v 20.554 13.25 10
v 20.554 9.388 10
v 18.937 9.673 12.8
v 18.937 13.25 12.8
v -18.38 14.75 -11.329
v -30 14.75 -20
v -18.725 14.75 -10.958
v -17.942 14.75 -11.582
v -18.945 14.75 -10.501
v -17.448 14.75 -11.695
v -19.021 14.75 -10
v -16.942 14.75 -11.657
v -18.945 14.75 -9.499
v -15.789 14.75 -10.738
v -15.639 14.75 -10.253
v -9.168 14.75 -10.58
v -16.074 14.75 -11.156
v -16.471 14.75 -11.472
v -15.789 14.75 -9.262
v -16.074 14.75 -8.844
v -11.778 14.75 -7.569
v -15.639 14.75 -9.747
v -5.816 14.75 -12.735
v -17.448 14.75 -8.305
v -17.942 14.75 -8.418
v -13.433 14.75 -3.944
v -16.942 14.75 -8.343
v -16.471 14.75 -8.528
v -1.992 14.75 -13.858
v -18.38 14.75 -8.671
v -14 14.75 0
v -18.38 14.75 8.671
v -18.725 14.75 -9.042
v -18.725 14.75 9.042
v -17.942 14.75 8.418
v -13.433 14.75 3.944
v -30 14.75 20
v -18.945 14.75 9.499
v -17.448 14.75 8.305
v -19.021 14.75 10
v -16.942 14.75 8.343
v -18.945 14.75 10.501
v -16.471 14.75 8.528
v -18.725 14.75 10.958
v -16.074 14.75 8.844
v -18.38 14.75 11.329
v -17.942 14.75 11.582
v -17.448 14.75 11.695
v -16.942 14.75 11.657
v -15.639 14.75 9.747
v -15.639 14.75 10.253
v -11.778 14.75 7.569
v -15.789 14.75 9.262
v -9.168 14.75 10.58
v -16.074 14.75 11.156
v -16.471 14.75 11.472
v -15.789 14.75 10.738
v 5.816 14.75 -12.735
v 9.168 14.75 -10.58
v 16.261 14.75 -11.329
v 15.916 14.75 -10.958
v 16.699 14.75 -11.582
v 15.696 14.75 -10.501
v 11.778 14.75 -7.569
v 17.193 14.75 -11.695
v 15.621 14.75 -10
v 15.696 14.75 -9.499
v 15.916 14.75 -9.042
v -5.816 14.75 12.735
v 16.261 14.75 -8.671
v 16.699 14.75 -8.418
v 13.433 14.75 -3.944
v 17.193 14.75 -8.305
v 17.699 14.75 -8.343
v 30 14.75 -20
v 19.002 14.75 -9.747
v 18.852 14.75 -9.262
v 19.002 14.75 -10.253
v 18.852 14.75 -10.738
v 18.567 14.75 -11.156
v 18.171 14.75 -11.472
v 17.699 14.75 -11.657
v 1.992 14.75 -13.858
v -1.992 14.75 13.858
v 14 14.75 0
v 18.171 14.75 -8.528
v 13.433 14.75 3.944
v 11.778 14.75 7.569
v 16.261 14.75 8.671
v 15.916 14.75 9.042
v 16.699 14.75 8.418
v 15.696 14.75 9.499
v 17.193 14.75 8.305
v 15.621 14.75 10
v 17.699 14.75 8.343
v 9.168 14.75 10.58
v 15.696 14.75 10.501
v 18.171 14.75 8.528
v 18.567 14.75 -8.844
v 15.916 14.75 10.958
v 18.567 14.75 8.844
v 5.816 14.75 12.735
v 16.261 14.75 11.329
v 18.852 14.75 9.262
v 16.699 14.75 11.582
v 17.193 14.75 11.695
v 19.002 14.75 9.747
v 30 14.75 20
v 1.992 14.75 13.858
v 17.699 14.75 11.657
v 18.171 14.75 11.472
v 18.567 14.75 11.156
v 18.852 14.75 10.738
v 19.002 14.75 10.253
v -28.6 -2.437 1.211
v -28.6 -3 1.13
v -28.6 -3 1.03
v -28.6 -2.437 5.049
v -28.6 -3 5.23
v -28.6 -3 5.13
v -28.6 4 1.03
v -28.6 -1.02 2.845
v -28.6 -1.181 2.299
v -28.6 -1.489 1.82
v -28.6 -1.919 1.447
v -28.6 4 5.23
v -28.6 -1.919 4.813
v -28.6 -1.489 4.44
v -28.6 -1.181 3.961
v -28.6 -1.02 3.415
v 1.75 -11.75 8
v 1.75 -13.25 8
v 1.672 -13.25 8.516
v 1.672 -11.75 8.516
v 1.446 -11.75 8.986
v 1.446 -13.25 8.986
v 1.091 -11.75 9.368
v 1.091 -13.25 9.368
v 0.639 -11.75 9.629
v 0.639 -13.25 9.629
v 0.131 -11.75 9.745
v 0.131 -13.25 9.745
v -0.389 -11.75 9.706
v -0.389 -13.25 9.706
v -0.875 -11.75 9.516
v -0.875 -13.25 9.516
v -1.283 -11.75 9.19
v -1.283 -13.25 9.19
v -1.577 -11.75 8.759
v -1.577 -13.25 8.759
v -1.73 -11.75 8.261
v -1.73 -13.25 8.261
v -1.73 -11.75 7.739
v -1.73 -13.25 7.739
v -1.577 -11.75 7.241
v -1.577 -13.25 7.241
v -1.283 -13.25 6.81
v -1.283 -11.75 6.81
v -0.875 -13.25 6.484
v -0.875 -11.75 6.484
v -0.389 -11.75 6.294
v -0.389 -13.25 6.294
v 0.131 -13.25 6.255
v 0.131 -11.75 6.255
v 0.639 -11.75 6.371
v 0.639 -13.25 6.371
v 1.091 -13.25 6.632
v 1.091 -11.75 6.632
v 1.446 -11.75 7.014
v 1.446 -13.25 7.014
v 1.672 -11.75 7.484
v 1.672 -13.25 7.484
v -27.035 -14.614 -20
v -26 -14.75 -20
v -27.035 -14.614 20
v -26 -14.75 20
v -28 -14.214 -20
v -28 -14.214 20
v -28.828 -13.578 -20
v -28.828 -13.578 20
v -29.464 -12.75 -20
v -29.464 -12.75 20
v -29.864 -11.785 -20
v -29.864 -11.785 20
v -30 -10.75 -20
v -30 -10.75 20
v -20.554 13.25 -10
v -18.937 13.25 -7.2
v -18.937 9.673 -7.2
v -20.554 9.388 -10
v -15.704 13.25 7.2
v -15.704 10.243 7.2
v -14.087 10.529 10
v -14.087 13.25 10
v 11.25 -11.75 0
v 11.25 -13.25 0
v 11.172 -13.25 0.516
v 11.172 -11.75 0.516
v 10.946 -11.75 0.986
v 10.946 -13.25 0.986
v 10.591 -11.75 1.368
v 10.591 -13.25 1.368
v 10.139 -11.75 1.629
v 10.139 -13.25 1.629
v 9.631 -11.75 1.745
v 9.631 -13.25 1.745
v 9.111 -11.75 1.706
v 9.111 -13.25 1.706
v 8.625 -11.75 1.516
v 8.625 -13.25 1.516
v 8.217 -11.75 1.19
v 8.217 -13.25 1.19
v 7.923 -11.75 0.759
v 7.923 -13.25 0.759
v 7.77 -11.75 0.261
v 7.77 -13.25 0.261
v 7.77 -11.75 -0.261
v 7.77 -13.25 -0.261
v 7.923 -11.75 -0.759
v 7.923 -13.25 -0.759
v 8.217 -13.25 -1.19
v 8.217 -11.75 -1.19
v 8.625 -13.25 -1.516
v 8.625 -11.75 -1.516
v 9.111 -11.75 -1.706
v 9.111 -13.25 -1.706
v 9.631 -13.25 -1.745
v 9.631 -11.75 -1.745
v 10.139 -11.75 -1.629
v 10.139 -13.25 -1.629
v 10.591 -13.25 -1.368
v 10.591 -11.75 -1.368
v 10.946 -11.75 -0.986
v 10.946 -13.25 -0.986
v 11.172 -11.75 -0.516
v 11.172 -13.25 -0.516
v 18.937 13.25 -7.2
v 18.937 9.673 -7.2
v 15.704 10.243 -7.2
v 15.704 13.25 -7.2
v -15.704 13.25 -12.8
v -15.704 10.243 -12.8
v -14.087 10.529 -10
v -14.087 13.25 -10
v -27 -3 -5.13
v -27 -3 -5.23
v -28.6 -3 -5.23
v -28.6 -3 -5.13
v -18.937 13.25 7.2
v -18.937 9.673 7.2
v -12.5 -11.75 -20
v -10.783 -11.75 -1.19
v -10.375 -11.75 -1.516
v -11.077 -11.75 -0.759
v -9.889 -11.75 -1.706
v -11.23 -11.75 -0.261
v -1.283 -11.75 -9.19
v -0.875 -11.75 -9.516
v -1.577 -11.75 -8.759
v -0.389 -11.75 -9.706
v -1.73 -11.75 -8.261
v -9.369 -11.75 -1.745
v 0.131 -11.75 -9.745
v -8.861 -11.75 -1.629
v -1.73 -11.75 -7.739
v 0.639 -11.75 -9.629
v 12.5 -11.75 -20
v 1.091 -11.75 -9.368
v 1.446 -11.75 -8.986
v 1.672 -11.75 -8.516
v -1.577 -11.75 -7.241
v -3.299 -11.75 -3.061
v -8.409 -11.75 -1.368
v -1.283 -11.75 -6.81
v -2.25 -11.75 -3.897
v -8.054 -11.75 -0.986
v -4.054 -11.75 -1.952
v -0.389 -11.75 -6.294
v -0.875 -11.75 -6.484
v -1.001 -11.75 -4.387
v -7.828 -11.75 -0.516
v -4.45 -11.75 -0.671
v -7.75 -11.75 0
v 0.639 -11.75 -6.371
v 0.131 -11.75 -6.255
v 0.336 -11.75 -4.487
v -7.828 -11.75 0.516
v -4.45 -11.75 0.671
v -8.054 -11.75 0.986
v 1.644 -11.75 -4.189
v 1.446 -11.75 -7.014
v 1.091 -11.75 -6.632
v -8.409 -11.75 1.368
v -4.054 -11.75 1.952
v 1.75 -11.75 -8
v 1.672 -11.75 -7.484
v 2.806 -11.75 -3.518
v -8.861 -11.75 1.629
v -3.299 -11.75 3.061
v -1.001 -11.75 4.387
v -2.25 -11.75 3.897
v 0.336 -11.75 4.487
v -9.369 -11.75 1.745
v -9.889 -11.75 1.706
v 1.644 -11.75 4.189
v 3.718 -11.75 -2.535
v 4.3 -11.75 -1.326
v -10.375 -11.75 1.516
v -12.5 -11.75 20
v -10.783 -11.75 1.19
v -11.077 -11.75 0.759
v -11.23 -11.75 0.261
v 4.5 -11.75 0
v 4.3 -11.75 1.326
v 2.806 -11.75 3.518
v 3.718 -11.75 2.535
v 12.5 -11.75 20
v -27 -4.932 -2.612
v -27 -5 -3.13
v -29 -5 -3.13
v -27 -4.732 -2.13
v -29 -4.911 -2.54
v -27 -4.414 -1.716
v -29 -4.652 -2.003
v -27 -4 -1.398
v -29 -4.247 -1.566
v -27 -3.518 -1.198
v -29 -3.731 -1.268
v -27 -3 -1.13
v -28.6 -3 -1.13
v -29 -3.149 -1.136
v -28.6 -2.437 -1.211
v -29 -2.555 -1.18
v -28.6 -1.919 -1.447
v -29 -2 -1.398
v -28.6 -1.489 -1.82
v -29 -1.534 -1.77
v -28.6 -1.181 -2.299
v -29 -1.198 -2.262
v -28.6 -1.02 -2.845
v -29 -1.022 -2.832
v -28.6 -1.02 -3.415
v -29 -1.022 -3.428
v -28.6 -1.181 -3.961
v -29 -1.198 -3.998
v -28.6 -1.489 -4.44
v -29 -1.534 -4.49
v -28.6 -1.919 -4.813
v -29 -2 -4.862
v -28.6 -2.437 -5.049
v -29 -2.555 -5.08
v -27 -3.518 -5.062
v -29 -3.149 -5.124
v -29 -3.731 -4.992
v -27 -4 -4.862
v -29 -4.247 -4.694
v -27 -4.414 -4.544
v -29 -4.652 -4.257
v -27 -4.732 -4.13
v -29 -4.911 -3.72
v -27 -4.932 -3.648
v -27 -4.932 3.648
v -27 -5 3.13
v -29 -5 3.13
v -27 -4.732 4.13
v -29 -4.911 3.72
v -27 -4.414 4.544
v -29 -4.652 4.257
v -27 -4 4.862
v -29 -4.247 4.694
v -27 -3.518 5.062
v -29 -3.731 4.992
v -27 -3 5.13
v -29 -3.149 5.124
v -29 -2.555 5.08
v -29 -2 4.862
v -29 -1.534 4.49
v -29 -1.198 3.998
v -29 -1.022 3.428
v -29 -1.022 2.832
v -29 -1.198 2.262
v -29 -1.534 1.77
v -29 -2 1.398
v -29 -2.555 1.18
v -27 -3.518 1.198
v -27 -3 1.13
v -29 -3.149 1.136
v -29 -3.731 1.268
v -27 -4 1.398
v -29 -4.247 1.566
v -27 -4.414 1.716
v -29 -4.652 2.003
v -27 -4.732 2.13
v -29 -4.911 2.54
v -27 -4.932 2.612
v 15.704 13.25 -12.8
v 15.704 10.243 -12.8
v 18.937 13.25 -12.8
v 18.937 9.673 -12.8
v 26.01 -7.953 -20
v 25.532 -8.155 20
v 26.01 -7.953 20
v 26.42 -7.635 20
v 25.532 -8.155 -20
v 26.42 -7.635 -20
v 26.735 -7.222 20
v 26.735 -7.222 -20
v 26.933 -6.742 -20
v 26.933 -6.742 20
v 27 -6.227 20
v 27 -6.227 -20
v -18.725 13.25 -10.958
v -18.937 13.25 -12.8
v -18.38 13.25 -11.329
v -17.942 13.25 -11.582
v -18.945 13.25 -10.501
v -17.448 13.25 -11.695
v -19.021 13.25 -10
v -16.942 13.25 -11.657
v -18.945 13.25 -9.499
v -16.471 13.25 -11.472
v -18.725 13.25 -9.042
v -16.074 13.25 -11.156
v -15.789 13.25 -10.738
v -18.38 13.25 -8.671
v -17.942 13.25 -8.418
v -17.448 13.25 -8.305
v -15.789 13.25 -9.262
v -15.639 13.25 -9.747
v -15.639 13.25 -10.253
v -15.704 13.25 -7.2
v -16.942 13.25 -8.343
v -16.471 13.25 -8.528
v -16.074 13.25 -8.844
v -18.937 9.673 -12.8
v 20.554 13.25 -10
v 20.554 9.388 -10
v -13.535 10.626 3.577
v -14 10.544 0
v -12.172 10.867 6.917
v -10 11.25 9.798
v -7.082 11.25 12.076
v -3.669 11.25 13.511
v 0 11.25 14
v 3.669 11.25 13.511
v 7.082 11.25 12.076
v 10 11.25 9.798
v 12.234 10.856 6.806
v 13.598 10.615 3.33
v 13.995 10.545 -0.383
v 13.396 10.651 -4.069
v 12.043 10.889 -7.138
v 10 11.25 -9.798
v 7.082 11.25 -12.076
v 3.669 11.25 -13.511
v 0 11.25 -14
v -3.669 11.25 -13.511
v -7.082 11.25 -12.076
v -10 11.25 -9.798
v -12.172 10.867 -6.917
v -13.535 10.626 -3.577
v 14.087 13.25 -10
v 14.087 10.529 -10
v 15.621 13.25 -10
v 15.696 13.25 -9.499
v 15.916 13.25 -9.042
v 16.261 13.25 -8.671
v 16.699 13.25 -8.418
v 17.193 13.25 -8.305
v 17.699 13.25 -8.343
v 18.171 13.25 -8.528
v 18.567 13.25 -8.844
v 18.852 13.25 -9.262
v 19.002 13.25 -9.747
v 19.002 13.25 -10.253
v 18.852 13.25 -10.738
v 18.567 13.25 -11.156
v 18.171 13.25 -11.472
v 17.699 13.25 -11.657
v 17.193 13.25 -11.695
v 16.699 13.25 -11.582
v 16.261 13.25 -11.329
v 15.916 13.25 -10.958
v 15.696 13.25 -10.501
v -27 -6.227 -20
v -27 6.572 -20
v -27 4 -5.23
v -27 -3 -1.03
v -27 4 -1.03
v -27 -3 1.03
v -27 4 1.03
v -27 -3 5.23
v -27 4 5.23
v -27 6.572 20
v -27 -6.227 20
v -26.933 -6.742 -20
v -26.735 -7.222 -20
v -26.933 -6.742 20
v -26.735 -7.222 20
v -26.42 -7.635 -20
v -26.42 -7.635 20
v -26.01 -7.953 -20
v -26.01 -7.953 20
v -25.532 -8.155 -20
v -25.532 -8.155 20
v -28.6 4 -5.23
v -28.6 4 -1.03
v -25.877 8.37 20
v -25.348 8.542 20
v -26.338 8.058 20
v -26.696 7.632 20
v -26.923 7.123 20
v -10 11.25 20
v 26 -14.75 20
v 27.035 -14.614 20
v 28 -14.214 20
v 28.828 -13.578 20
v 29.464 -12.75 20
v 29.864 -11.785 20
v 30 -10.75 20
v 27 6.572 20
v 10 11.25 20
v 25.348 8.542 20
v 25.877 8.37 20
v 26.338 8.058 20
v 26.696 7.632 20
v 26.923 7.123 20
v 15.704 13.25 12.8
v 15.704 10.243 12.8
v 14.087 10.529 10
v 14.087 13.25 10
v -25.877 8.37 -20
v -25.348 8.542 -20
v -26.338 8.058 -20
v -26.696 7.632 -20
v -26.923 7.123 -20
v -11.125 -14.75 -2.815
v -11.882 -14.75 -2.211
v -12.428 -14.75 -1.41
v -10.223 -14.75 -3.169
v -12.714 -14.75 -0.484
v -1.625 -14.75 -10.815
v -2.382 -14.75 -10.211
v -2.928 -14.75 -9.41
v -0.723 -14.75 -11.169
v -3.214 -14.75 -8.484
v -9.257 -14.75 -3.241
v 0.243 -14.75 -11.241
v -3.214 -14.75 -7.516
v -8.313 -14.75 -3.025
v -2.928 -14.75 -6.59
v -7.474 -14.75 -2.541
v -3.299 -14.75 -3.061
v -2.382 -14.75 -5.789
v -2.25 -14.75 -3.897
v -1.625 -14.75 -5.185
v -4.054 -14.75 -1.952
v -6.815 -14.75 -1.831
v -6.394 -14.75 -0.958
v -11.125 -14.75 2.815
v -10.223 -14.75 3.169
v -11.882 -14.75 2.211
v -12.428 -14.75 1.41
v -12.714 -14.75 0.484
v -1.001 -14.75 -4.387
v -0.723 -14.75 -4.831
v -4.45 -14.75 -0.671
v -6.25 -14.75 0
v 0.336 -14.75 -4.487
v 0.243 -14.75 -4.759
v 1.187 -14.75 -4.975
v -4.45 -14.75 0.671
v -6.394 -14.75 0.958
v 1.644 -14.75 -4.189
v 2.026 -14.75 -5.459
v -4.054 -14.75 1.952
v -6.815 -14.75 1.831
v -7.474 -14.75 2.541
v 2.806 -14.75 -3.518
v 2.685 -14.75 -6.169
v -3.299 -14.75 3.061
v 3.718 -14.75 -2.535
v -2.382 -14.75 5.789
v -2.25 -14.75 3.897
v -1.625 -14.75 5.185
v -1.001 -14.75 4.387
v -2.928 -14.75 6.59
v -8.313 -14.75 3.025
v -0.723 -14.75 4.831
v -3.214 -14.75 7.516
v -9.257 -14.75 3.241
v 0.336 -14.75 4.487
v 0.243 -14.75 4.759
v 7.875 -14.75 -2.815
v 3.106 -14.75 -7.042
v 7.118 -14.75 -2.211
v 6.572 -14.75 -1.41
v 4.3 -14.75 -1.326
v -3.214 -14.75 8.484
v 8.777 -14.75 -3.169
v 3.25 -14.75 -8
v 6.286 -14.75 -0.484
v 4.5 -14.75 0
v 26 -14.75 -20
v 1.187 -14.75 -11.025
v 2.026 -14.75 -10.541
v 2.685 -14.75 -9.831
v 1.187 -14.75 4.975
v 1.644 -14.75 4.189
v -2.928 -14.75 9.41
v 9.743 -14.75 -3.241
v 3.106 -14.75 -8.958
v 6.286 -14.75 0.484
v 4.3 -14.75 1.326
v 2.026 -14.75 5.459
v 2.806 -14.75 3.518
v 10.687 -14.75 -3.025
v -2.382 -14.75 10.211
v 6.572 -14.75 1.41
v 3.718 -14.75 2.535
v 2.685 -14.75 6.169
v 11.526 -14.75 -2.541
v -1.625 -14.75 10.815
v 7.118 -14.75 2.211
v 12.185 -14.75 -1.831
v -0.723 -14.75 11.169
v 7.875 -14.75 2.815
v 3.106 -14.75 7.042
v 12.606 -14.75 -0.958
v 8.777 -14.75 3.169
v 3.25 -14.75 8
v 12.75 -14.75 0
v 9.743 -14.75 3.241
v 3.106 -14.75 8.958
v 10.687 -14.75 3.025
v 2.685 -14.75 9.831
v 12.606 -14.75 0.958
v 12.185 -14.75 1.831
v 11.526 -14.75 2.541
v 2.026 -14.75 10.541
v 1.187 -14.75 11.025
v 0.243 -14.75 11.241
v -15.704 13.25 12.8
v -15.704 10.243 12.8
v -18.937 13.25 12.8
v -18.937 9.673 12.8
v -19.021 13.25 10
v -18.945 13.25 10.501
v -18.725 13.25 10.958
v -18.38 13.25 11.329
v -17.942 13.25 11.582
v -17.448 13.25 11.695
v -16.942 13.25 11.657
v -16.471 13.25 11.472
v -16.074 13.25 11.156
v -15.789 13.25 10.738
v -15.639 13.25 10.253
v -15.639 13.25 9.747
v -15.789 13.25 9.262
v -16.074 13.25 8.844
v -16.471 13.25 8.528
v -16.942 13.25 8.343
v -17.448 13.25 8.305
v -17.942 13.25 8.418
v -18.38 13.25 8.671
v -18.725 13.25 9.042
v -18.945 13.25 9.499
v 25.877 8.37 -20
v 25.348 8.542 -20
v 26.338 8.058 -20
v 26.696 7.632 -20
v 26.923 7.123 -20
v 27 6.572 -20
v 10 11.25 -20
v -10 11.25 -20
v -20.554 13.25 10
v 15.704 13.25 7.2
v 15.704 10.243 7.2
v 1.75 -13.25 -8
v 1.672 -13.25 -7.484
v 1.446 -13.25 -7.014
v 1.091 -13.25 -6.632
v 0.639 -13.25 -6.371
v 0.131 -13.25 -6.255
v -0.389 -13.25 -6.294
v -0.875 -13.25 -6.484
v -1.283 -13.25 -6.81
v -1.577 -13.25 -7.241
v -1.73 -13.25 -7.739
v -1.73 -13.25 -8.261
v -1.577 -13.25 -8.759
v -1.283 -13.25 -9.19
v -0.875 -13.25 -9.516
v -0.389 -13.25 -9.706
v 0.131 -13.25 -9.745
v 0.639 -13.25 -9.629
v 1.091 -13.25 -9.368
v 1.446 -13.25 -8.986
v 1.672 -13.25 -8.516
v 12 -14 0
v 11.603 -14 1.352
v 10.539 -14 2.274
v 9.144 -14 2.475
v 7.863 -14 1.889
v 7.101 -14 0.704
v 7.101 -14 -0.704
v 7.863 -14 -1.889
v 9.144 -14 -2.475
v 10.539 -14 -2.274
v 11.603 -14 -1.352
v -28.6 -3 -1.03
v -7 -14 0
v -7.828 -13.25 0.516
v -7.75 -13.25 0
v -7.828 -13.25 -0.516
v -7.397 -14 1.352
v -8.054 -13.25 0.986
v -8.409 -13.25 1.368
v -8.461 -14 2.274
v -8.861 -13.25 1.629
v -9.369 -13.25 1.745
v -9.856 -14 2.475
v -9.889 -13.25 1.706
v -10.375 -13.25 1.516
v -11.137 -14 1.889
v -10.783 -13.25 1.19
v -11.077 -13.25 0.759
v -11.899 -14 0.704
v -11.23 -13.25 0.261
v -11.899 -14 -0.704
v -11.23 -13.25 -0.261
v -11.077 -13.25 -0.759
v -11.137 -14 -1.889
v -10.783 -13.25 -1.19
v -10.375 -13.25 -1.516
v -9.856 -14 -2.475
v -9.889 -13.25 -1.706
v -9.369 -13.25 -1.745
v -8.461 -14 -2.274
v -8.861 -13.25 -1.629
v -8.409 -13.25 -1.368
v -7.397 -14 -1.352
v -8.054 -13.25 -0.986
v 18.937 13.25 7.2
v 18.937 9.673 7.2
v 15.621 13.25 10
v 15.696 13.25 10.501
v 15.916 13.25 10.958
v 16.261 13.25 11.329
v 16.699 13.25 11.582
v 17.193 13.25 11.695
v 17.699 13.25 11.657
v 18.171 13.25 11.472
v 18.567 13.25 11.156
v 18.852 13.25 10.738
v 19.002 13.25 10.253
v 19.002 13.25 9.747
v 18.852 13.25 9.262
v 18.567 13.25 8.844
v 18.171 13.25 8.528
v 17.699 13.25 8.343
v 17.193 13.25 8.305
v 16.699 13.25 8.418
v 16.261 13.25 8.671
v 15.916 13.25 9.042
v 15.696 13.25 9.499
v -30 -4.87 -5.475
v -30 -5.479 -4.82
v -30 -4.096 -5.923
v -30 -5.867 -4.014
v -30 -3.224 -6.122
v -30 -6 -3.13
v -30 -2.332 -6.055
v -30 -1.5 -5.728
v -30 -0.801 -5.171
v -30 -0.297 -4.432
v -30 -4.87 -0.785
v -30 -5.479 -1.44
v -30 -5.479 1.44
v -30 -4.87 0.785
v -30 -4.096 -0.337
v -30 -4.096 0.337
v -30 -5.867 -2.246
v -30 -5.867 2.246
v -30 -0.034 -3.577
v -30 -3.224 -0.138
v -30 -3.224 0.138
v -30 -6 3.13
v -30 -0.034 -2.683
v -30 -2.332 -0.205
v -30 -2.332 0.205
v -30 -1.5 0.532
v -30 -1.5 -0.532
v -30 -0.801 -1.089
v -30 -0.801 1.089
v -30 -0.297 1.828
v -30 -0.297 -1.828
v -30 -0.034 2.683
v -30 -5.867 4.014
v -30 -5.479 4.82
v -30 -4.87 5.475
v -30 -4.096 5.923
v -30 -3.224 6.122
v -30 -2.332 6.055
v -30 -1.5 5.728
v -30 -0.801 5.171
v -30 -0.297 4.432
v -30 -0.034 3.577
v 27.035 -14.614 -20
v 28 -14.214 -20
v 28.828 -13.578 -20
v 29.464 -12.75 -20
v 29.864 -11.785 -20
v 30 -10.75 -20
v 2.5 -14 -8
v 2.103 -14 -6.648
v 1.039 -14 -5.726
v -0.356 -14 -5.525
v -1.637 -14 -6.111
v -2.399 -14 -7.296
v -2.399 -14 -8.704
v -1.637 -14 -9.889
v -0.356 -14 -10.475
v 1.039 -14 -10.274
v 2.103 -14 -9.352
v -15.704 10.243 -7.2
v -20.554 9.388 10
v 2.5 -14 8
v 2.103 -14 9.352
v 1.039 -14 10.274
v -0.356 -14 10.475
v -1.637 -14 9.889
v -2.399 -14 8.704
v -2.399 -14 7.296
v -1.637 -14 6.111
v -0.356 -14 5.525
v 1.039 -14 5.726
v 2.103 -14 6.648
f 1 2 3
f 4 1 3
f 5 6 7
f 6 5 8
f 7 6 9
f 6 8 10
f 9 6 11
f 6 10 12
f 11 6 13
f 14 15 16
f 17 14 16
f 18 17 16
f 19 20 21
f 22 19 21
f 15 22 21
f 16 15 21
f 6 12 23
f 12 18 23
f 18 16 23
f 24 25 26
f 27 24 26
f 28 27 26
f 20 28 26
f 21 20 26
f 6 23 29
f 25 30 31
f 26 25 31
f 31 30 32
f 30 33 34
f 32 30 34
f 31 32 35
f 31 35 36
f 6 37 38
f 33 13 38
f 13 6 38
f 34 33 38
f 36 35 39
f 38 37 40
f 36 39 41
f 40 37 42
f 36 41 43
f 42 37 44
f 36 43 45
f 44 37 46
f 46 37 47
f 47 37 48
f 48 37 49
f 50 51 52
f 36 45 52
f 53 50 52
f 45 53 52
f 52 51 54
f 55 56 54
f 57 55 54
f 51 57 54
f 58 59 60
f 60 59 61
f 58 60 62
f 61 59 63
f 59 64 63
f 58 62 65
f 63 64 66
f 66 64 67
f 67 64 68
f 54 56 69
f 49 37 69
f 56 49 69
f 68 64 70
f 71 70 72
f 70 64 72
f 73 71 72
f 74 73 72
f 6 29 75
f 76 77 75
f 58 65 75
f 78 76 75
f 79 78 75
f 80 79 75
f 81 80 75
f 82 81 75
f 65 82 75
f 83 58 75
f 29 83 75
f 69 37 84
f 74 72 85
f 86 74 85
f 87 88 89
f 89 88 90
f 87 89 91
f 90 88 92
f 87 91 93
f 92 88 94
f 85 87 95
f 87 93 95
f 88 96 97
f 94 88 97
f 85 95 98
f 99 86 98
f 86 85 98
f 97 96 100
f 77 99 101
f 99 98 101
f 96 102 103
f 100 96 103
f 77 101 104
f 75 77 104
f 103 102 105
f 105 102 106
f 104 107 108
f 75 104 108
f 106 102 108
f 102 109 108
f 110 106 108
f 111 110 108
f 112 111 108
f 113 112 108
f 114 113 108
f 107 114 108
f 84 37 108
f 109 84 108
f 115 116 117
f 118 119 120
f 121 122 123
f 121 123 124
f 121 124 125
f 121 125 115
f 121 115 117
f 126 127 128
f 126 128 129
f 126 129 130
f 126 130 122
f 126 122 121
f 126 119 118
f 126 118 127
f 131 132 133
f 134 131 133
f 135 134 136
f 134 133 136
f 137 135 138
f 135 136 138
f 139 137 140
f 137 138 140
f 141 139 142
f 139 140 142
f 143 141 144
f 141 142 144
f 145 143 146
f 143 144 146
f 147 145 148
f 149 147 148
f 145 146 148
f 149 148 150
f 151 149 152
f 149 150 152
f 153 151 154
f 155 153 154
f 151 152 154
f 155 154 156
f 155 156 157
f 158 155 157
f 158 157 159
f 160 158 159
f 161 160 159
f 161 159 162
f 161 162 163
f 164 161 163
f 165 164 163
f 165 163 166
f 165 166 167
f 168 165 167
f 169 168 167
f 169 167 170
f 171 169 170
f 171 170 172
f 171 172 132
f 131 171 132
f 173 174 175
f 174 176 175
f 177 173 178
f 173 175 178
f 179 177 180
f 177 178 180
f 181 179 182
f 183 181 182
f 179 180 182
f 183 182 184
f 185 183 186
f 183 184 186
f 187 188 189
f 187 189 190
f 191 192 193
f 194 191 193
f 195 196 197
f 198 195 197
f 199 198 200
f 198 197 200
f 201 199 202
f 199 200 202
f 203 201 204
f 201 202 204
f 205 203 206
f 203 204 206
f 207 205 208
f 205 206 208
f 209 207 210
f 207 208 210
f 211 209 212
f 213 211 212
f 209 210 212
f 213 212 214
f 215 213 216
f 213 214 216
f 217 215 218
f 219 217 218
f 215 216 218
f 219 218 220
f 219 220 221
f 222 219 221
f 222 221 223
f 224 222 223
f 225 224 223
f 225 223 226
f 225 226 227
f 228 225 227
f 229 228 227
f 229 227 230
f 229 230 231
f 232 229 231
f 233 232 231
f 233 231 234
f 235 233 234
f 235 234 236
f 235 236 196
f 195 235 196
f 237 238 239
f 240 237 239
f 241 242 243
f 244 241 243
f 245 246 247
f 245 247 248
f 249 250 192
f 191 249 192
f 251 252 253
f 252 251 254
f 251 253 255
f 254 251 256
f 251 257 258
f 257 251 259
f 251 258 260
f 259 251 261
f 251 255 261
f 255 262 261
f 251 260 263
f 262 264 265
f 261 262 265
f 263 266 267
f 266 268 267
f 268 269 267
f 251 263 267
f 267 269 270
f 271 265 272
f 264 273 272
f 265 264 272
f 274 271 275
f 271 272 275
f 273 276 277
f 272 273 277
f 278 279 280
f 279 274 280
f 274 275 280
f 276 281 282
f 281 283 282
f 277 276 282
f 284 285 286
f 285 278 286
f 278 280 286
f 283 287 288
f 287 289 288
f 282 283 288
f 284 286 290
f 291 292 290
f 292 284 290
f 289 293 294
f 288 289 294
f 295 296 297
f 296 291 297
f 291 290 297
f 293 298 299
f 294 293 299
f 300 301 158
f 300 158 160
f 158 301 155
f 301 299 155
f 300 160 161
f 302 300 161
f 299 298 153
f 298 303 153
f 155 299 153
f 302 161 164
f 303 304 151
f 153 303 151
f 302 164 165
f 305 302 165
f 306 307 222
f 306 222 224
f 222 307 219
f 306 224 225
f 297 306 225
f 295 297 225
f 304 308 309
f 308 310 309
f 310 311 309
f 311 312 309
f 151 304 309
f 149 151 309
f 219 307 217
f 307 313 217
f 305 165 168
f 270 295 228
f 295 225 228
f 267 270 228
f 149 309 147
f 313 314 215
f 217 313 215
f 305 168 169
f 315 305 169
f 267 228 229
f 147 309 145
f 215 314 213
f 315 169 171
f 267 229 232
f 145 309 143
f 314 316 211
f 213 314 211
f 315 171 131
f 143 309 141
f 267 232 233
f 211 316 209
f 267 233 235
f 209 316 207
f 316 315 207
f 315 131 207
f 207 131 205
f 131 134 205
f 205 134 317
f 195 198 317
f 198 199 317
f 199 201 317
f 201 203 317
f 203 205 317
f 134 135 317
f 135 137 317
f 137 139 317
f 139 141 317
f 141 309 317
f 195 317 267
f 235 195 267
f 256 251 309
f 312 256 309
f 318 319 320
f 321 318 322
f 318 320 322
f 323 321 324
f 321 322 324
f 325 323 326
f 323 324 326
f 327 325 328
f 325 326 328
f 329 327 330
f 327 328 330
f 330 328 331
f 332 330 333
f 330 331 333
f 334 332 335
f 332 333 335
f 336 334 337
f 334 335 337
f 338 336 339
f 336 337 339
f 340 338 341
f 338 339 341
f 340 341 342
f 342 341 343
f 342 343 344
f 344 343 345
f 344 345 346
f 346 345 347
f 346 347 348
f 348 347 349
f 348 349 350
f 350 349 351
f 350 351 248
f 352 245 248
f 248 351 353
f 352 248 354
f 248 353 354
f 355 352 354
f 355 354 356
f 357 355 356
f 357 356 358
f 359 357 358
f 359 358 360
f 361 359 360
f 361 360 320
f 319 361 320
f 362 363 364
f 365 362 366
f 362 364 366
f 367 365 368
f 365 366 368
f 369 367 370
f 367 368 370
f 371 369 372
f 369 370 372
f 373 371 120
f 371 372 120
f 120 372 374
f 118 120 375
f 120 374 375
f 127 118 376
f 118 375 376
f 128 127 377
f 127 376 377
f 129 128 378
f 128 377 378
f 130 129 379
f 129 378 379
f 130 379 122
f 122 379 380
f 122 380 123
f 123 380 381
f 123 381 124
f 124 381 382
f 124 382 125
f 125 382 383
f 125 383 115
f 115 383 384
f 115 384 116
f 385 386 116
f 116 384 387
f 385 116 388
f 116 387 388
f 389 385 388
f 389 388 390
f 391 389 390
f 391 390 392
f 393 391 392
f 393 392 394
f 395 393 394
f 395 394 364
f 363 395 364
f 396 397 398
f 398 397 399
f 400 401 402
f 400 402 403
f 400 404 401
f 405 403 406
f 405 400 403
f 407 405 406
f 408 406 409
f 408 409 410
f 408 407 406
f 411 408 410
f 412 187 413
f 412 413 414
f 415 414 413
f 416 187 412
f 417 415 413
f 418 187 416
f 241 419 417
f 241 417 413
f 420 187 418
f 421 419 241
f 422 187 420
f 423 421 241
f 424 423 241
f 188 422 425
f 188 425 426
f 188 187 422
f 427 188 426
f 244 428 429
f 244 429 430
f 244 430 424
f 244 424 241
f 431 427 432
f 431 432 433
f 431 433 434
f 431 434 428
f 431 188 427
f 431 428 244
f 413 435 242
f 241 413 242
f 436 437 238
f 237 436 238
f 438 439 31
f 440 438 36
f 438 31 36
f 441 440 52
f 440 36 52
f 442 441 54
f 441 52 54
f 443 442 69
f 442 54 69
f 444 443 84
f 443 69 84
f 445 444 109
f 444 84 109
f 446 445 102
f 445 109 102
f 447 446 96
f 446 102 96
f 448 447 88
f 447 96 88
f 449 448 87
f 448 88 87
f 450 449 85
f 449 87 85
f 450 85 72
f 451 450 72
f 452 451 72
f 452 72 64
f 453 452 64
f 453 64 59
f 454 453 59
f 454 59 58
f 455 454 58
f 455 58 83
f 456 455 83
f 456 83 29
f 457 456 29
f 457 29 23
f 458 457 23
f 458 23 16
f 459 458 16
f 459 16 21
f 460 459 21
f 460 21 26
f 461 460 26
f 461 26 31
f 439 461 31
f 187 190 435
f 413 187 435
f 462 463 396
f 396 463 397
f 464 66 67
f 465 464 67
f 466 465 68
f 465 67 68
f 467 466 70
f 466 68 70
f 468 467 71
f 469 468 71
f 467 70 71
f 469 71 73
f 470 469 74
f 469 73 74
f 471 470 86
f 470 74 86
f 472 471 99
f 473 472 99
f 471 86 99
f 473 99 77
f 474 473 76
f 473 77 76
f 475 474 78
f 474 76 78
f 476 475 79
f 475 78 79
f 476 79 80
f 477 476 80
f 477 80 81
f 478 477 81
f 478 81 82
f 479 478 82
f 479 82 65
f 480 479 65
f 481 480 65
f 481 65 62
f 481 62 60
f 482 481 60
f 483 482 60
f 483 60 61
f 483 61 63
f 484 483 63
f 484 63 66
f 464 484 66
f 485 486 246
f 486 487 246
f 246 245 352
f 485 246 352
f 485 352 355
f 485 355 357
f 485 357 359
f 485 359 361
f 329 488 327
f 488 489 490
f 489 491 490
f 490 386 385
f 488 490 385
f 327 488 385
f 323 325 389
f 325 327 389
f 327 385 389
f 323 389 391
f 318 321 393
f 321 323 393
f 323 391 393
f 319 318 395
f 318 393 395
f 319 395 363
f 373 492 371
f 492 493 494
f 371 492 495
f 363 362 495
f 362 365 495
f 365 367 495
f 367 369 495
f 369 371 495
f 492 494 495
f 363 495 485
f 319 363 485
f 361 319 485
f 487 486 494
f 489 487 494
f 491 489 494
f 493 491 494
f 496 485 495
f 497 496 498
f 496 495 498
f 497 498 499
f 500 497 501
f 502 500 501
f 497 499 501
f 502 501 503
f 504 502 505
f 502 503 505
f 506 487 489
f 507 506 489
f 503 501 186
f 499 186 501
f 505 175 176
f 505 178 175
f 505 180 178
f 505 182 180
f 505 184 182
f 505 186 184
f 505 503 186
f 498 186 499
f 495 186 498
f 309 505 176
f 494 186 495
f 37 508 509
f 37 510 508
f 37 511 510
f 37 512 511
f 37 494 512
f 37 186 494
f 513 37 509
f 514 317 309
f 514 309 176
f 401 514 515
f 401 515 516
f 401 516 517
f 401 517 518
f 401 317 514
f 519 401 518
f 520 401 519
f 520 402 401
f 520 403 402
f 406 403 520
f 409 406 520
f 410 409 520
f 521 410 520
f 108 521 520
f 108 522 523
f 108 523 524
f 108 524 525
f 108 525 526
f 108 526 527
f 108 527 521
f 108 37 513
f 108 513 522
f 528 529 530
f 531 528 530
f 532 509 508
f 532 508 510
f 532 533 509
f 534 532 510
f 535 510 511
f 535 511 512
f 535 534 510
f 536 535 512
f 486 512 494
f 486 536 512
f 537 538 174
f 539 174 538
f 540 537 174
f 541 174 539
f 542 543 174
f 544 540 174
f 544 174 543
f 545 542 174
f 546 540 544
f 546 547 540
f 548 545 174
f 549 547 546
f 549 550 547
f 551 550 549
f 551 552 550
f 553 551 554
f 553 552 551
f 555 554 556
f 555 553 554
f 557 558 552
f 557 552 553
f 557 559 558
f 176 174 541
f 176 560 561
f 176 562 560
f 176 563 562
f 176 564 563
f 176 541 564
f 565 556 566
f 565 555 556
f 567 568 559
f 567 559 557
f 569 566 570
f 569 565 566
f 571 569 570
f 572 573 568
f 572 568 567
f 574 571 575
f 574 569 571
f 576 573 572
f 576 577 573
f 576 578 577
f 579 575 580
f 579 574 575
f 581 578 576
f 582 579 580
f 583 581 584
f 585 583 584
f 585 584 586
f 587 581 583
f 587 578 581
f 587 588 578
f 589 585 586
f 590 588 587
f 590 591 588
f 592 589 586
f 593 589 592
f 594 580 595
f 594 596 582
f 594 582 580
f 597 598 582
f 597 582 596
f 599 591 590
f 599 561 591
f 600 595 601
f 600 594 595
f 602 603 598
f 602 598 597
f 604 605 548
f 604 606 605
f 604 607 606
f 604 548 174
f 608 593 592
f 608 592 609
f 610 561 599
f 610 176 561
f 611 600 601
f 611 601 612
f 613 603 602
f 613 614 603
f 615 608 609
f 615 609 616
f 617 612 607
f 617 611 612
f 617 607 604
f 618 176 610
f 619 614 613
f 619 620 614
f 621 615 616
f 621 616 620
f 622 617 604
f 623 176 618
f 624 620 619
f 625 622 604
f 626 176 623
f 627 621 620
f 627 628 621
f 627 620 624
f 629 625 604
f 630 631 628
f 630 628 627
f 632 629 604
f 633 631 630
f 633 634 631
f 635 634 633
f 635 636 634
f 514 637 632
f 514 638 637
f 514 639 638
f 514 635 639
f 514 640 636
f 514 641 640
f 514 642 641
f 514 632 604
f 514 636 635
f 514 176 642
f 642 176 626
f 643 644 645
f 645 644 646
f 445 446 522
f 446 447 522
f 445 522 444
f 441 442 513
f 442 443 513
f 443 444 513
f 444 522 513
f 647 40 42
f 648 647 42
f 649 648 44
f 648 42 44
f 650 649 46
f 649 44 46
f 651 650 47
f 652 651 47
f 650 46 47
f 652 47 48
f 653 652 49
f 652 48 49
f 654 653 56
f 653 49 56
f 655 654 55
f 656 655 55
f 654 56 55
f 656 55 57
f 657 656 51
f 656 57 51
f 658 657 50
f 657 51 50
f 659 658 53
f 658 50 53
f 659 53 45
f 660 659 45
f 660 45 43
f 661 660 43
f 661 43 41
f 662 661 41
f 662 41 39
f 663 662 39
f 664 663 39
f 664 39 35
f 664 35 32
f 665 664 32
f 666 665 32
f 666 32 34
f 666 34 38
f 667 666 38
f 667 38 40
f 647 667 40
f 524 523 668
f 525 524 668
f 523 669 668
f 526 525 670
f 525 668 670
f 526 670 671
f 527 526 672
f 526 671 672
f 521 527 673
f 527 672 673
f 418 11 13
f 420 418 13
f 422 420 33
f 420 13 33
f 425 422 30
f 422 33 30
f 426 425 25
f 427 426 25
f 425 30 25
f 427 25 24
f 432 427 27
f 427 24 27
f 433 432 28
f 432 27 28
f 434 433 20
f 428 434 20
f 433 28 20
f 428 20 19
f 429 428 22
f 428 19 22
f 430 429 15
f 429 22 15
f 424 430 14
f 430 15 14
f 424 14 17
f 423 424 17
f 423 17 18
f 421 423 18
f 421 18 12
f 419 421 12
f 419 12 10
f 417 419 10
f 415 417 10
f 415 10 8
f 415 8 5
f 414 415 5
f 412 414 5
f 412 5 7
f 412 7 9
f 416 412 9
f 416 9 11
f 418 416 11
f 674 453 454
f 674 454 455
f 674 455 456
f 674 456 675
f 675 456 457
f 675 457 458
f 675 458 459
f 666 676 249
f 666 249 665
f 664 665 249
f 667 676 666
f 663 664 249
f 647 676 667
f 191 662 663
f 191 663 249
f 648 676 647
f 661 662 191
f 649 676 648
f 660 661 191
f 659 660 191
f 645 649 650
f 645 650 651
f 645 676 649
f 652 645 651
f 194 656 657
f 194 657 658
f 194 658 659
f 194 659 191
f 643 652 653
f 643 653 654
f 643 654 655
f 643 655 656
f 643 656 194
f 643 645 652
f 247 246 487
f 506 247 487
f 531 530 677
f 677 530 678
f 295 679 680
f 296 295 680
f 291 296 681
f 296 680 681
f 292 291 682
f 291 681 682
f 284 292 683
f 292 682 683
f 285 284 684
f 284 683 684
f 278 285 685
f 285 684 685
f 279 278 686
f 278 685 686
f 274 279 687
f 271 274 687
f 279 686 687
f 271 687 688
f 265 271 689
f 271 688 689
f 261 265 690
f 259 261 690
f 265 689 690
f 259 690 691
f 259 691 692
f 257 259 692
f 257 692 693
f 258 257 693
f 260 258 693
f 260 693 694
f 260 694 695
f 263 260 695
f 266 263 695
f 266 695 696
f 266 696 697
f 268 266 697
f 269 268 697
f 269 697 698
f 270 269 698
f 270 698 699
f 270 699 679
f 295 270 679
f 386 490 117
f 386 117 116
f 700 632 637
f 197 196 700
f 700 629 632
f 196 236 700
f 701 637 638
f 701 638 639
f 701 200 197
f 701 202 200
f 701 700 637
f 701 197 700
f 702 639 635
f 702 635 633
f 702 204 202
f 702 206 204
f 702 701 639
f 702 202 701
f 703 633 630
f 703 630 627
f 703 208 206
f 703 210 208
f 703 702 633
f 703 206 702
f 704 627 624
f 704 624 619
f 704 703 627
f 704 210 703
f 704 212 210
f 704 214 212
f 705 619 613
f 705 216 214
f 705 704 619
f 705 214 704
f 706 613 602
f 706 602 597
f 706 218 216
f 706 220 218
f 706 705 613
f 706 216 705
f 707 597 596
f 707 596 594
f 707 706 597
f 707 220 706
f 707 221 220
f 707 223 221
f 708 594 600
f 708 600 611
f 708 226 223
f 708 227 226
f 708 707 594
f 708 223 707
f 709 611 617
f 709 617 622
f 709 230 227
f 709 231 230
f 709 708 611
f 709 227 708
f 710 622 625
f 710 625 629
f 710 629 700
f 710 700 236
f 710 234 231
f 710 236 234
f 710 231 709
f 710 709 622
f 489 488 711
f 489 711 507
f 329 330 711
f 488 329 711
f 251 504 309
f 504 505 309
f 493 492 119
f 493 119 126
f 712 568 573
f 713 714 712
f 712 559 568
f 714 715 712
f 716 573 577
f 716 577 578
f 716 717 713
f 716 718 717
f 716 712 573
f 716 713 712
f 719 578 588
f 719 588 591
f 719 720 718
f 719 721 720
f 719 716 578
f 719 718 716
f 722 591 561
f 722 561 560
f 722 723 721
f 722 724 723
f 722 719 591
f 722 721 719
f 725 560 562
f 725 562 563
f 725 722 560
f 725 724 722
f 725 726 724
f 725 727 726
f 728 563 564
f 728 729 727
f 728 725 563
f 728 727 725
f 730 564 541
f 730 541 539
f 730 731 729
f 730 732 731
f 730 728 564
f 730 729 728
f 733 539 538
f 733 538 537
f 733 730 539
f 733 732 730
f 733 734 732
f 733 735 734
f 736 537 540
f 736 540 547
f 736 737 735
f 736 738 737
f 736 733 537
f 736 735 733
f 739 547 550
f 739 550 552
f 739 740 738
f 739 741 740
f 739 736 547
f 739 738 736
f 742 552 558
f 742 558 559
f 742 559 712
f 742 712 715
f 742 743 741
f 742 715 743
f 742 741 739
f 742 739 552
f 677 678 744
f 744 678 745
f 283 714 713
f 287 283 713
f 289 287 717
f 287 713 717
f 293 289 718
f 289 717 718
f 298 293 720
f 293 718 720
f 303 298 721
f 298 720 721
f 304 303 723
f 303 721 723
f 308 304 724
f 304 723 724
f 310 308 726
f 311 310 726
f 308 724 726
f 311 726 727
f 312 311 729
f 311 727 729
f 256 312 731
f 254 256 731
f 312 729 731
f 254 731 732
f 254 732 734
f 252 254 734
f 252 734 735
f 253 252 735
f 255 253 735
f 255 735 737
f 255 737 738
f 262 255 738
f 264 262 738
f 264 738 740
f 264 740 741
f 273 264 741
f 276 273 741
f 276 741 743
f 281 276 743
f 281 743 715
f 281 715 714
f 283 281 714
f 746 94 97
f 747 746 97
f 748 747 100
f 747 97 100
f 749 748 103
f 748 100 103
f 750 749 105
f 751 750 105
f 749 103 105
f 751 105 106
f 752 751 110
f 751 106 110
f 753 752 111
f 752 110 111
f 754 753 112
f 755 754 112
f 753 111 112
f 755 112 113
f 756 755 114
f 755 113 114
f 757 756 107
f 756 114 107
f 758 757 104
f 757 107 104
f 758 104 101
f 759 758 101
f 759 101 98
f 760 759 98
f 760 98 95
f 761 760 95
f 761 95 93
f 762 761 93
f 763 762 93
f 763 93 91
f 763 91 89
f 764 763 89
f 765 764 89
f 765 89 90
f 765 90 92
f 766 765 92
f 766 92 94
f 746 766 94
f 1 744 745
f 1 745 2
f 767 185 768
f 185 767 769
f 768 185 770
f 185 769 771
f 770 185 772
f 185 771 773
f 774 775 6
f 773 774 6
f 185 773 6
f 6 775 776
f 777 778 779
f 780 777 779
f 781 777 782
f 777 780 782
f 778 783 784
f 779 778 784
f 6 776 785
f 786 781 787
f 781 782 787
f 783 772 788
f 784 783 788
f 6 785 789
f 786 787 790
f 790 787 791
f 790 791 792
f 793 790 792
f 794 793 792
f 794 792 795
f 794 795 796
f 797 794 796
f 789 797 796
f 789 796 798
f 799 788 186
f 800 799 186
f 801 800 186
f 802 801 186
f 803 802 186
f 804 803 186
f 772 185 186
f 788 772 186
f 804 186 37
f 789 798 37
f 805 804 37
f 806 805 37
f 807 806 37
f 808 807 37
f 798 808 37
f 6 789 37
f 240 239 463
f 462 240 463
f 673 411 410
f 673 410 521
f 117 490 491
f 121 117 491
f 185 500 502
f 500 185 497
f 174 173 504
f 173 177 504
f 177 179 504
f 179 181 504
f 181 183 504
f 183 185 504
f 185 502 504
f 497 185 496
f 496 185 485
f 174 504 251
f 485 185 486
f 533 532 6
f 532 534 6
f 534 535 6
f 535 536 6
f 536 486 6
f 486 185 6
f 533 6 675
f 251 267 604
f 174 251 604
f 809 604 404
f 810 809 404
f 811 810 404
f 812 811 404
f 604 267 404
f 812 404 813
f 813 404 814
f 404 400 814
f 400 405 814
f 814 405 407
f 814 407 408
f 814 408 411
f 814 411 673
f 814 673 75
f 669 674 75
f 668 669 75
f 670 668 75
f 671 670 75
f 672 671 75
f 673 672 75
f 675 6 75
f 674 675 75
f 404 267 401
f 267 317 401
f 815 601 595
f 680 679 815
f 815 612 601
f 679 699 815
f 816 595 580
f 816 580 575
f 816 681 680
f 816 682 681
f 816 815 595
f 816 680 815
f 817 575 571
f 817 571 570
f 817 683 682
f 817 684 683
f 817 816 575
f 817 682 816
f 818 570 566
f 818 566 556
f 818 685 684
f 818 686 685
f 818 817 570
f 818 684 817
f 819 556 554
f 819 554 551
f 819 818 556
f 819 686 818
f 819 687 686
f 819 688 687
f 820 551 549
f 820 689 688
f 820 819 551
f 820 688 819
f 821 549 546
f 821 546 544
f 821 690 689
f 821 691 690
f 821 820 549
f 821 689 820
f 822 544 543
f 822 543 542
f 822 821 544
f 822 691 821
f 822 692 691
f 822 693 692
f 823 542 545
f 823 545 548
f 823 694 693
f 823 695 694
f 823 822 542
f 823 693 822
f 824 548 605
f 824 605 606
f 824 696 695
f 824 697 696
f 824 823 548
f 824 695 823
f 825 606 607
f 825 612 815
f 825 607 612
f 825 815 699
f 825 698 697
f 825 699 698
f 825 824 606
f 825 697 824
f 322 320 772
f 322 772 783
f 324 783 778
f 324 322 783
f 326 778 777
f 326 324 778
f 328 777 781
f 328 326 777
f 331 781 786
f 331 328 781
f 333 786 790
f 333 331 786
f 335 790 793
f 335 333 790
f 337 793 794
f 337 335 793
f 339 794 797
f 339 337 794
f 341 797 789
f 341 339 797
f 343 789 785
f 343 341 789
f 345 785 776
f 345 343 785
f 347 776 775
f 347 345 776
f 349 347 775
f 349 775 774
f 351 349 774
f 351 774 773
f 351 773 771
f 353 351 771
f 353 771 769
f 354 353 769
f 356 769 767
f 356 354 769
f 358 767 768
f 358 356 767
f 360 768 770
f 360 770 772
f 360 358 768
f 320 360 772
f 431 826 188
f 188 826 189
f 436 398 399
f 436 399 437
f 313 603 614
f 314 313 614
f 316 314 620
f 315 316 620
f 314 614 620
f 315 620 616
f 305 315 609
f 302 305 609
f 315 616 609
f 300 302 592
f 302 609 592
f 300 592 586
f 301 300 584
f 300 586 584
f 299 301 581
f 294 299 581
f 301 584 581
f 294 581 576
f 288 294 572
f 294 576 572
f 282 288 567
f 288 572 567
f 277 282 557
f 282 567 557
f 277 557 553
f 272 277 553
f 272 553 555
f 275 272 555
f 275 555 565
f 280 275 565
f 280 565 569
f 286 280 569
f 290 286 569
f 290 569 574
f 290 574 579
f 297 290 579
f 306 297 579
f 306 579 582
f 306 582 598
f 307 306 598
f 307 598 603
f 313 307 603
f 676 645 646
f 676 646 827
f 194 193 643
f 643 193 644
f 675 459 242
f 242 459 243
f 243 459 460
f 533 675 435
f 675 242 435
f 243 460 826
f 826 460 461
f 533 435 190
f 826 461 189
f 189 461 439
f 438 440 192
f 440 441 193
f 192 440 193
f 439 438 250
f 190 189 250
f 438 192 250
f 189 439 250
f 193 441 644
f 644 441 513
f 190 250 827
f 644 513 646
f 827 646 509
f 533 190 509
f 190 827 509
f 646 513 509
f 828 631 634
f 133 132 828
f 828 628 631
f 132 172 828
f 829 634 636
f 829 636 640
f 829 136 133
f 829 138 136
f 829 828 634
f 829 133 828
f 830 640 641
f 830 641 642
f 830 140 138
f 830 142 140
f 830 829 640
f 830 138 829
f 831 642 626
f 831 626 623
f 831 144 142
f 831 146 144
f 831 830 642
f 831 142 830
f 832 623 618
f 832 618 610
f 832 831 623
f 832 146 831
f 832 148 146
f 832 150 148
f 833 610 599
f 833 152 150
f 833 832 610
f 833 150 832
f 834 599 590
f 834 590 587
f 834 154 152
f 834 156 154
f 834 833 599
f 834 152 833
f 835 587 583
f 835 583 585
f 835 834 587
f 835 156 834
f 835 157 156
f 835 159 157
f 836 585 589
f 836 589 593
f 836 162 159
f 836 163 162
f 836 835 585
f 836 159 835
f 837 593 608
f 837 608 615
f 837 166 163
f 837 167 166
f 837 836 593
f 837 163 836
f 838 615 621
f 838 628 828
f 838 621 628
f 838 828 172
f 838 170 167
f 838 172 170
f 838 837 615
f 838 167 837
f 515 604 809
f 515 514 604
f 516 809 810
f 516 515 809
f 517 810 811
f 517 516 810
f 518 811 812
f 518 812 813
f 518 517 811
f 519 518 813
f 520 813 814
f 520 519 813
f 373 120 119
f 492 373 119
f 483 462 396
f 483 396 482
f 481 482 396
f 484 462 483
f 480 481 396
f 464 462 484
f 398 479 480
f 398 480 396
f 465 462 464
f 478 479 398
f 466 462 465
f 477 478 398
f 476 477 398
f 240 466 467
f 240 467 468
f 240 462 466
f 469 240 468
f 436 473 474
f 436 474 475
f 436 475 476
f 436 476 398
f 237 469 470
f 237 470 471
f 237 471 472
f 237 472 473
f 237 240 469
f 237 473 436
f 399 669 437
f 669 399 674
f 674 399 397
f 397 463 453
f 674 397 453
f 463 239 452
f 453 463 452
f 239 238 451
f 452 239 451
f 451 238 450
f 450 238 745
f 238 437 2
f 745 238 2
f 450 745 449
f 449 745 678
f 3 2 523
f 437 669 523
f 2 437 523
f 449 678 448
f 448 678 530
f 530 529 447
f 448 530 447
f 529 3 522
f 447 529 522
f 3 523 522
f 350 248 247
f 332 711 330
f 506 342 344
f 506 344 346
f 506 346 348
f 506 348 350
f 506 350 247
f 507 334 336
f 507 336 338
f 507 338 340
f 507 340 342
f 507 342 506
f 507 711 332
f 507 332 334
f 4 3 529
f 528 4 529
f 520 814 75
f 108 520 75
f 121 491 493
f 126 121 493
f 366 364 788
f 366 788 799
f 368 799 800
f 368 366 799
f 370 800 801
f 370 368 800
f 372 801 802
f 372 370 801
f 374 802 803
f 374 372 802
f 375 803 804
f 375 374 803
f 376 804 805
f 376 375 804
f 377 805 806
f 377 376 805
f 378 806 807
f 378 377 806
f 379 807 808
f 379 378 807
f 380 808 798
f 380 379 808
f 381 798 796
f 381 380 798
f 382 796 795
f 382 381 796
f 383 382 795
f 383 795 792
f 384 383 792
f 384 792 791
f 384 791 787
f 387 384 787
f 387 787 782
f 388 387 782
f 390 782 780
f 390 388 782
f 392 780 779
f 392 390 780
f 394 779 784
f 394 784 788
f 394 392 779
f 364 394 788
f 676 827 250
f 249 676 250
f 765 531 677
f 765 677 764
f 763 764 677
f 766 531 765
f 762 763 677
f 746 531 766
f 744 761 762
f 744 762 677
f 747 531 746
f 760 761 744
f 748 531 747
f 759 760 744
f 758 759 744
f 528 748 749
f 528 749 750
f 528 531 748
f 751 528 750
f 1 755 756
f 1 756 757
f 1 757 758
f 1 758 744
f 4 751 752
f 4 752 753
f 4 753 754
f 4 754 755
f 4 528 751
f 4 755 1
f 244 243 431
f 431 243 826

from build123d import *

# Parameters (mm, degrees)
SKETCH_W        = 60
SKETCH_H        = 29.5
PAD_DEPTH       = 20
SKETCH020_R     = 1.7
SKETCH020_R_2   = 14
POCKET_DEPTH    = 20
SKETCH001_R     = 1.75
SKETCH001_R_2   = 4.5
POCKET001_DEPTH = 5
SKETCH024_R     = 2.220567
PAD001_DEPTH    = 4
POCKET003_DEPTH = 6
SKETCH022_R     = 2
POCKET004_DEPTH = 3
SKETCH023_W     = 7
SKETCH023_H     = 4.2
POCKET005_DEPTH = 1.6
CHAMFER_SIZE    = 1
CHAMFER001_SIZE = 1
CHAMFER002_SIZE = 1.5
CHAMFER003_SIZE = 1.5
CHAMFER004_SIZE = 1.5
CHAMFER005_SIZE = 1.5
FILLET_R        = 4
FILLET001_R     = 4
FILLET002_R     = 2
FILLET003_R     = 2
FILLET004_R     = 2
FILLET005_R     = 2


with BuildPart() as part:
    # Sketch → Pad (new body, symmetric)
    with BuildSketch(Plane.XY):
        Rectangle(SKETCH_W, SKETCH_H)
        Polygon((-27, -7.75), (-12.5, -11.75), (12.5, -11.75), (27, -7.75), (27, 8.25), (10, 11.25), (-10, 11.25), (-27, 8.25), align=None, mode=Mode.SUBTRACT)
    extrude(amount=PAD_DEPTH, both=True)

    # Sketch020 → Pocket (cut)
    with BuildSketch(Plane(origin=(0, 14.75, 0), x_dir=(-1, 0, 0), z_dir=(0, 1, 0))):
        with Locations((-17.320508, 10)):
            Circle(SKETCH020_R)
        with Locations((-17.320508, -10)):
            Circle(SKETCH020_R)
        with Locations((17.320508, 10)):
            Circle(SKETCH020_R)
        with Locations((17.320508, -10)):
            Circle(SKETCH020_R)
        Circle(SKETCH020_R_2)
    extrude(amount=-POCKET_DEPTH, mode=Mode.SUBTRACT)

    # Sketch001 → Pocket001 (cut)
    with BuildSketch(Plane.XZ.offset(14.75)):
        with Locations((0, 8)):
            Circle(SKETCH001_R)
        with Locations((0, -8)):
            Circle(SKETCH001_R)
        with Locations((-9.5, 0)):
            Circle(SKETCH001_R)
        with Locations((9.5, 0)):
            Circle(SKETCH001_R)
        Circle(SKETCH001_R_2)
    extrude(amount=-POCKET001_DEPTH, mode=Mode.SUBTRACT)

    # Sketch024 → Pad001 (new body)
    with BuildSketch(Plane.XZ.offset(-11.25)):
        with Locations((-17.320508, 10)):
            Circle(SKETCH024_R)
    extrude(amount=PAD001_DEPTH)

    # Sketch021 → Pocket003 (cut)
    with BuildSketch(Plane.XZ.offset(-7.25)):
        Polygon((-18.937089, 12.8), (-20.55367, 10), (-18.937089, 7.2), (-15.703927, 7.2), (-14.087347, 10), (-15.703927, 12.8), align=None)
        Polygon((15.703927, 12.8), (14.087347, 10), (15.703927, 7.2), (18.937089, 7.2), (20.55367, 10), (18.937089, 12.8), align=None)
        Polygon((-18.937089, -7.2), (-20.55367, -10), (-18.937089, -12.8), (-15.703927, -12.8), (-14.087347, -10), (-15.703927, -7.2), align=None)
        Polygon((15.703927, -7.2), (14.087347, -10), (15.703927, -12.8), (18.937089, -12.8), (20.55367, -10), (18.937089, -7.2), align=None)
    extrude(amount=-POCKET003_DEPTH, mode=Mode.SUBTRACT)

    # Sketch022 → Pocket004 (cut)
    with BuildSketch(Plane(origin=(-30, 0, 0), x_dir=(0, -1, 0), z_dir=(-1, 0, 0))):
        with Locations((3, 3.13)):
            Circle(SKETCH022_R)
        with Locations((3, -3.13)):
            Circle(SKETCH022_R)
    extrude(amount=-POCKET004_DEPTH, mode=Mode.SUBTRACT)

    # Sketch023 → Pocket005 (cut)
    with BuildSketch(Plane.YZ.offset(-27)):
        with Locations((0.5, 3.13)):
            Rectangle(SKETCH023_W, SKETCH023_H)
        with Locations((0.5, -3.13)):
            Rectangle(SKETCH023_W, SKETCH023_H)
    extrude(amount=-POCKET005_DEPTH, mode=Mode.SUBTRACT)

    # Chamfer
    chamfer_edges = [part.edges().sort_by_distance(p)[0] for p in [
        (-30, -1, 3.13),
    ]]
    chamfer(chamfer_edges, length=CHAMFER_SIZE)

    # Chamfer001
    chamfer001_edges = [part.edges().sort_by_distance(p)[0] for p in [
        (-30, -1, -3.13),
    ]]
    chamfer(chamfer001_edges, length=CHAMFER001_SIZE)

    # Chamfer002
    chamfer002_edges = [part.edges().sort_by_distance(p)[0] for p in [
        (-1.75, -14.75, 8),
    ]]
    chamfer(chamfer002_edges, length=CHAMFER002_SIZE)

    # Chamfer003
    chamfer003_edges = [part.edges().sort_by_distance(p)[0] for p in [
        (-11.25, -14.75, 0),
    ]]
    chamfer(chamfer003_edges, length=CHAMFER003_SIZE)

    # Chamfer004
    chamfer004_edges = [part.edges().sort_by_distance(p)[0] for p in [
        (7.75, -14.75, 0),
    ]]
    chamfer(chamfer004_edges, length=CHAMFER004_SIZE)

    # Chamfer005
    chamfer005_edges = [part.edges().sort_by_distance(p)[0] for p in [
        (-1.75, -14.75, -8),
    ]]
    chamfer(chamfer005_edges, length=CHAMFER005_SIZE)

    # Fillet
    fillet_edges = [part.edges().sort_by_distance(p)[0] for p in [
        (-30, -14.75, 0),
    ]]
    fillet(fillet_edges, radius=FILLET_R)

    # Fillet001
    fillet001_edges = [part.edges().sort_by_distance(p)[0] for p in [
        (30, -14.75, 0),
    ]]
    fillet(fillet001_edges, radius=FILLET001_R)

    # Fillet002
    fillet002_edges = [part.edges().sort_by_distance(p)[0] for p in [
        (-27, 8.25, 0),
    ]]
    fillet(fillet002_edges, radius=FILLET002_R)

    # Fillet003
    fillet003_edges = [part.edges().sort_by_distance(p)[0] for p in [
        (27, 8.25, 0),
    ]]
    fillet(fillet003_edges, radius=FILLET003_R)

    # Fillet004
    fillet004_edges = [part.edges().sort_by_distance(p)[0] for p in [
        (-27, -7.75, 0),
    ]]
    fillet(fillet004_edges, radius=FILLET004_R)

    # Fillet005
    fillet005_edges = [part.edges().sort_by_distance(p)[0] for p in [
        (27, -7.75, 0),
    ]]
    fillet(fillet005_edges, radius=FILLET005_R)


solid = part.part
